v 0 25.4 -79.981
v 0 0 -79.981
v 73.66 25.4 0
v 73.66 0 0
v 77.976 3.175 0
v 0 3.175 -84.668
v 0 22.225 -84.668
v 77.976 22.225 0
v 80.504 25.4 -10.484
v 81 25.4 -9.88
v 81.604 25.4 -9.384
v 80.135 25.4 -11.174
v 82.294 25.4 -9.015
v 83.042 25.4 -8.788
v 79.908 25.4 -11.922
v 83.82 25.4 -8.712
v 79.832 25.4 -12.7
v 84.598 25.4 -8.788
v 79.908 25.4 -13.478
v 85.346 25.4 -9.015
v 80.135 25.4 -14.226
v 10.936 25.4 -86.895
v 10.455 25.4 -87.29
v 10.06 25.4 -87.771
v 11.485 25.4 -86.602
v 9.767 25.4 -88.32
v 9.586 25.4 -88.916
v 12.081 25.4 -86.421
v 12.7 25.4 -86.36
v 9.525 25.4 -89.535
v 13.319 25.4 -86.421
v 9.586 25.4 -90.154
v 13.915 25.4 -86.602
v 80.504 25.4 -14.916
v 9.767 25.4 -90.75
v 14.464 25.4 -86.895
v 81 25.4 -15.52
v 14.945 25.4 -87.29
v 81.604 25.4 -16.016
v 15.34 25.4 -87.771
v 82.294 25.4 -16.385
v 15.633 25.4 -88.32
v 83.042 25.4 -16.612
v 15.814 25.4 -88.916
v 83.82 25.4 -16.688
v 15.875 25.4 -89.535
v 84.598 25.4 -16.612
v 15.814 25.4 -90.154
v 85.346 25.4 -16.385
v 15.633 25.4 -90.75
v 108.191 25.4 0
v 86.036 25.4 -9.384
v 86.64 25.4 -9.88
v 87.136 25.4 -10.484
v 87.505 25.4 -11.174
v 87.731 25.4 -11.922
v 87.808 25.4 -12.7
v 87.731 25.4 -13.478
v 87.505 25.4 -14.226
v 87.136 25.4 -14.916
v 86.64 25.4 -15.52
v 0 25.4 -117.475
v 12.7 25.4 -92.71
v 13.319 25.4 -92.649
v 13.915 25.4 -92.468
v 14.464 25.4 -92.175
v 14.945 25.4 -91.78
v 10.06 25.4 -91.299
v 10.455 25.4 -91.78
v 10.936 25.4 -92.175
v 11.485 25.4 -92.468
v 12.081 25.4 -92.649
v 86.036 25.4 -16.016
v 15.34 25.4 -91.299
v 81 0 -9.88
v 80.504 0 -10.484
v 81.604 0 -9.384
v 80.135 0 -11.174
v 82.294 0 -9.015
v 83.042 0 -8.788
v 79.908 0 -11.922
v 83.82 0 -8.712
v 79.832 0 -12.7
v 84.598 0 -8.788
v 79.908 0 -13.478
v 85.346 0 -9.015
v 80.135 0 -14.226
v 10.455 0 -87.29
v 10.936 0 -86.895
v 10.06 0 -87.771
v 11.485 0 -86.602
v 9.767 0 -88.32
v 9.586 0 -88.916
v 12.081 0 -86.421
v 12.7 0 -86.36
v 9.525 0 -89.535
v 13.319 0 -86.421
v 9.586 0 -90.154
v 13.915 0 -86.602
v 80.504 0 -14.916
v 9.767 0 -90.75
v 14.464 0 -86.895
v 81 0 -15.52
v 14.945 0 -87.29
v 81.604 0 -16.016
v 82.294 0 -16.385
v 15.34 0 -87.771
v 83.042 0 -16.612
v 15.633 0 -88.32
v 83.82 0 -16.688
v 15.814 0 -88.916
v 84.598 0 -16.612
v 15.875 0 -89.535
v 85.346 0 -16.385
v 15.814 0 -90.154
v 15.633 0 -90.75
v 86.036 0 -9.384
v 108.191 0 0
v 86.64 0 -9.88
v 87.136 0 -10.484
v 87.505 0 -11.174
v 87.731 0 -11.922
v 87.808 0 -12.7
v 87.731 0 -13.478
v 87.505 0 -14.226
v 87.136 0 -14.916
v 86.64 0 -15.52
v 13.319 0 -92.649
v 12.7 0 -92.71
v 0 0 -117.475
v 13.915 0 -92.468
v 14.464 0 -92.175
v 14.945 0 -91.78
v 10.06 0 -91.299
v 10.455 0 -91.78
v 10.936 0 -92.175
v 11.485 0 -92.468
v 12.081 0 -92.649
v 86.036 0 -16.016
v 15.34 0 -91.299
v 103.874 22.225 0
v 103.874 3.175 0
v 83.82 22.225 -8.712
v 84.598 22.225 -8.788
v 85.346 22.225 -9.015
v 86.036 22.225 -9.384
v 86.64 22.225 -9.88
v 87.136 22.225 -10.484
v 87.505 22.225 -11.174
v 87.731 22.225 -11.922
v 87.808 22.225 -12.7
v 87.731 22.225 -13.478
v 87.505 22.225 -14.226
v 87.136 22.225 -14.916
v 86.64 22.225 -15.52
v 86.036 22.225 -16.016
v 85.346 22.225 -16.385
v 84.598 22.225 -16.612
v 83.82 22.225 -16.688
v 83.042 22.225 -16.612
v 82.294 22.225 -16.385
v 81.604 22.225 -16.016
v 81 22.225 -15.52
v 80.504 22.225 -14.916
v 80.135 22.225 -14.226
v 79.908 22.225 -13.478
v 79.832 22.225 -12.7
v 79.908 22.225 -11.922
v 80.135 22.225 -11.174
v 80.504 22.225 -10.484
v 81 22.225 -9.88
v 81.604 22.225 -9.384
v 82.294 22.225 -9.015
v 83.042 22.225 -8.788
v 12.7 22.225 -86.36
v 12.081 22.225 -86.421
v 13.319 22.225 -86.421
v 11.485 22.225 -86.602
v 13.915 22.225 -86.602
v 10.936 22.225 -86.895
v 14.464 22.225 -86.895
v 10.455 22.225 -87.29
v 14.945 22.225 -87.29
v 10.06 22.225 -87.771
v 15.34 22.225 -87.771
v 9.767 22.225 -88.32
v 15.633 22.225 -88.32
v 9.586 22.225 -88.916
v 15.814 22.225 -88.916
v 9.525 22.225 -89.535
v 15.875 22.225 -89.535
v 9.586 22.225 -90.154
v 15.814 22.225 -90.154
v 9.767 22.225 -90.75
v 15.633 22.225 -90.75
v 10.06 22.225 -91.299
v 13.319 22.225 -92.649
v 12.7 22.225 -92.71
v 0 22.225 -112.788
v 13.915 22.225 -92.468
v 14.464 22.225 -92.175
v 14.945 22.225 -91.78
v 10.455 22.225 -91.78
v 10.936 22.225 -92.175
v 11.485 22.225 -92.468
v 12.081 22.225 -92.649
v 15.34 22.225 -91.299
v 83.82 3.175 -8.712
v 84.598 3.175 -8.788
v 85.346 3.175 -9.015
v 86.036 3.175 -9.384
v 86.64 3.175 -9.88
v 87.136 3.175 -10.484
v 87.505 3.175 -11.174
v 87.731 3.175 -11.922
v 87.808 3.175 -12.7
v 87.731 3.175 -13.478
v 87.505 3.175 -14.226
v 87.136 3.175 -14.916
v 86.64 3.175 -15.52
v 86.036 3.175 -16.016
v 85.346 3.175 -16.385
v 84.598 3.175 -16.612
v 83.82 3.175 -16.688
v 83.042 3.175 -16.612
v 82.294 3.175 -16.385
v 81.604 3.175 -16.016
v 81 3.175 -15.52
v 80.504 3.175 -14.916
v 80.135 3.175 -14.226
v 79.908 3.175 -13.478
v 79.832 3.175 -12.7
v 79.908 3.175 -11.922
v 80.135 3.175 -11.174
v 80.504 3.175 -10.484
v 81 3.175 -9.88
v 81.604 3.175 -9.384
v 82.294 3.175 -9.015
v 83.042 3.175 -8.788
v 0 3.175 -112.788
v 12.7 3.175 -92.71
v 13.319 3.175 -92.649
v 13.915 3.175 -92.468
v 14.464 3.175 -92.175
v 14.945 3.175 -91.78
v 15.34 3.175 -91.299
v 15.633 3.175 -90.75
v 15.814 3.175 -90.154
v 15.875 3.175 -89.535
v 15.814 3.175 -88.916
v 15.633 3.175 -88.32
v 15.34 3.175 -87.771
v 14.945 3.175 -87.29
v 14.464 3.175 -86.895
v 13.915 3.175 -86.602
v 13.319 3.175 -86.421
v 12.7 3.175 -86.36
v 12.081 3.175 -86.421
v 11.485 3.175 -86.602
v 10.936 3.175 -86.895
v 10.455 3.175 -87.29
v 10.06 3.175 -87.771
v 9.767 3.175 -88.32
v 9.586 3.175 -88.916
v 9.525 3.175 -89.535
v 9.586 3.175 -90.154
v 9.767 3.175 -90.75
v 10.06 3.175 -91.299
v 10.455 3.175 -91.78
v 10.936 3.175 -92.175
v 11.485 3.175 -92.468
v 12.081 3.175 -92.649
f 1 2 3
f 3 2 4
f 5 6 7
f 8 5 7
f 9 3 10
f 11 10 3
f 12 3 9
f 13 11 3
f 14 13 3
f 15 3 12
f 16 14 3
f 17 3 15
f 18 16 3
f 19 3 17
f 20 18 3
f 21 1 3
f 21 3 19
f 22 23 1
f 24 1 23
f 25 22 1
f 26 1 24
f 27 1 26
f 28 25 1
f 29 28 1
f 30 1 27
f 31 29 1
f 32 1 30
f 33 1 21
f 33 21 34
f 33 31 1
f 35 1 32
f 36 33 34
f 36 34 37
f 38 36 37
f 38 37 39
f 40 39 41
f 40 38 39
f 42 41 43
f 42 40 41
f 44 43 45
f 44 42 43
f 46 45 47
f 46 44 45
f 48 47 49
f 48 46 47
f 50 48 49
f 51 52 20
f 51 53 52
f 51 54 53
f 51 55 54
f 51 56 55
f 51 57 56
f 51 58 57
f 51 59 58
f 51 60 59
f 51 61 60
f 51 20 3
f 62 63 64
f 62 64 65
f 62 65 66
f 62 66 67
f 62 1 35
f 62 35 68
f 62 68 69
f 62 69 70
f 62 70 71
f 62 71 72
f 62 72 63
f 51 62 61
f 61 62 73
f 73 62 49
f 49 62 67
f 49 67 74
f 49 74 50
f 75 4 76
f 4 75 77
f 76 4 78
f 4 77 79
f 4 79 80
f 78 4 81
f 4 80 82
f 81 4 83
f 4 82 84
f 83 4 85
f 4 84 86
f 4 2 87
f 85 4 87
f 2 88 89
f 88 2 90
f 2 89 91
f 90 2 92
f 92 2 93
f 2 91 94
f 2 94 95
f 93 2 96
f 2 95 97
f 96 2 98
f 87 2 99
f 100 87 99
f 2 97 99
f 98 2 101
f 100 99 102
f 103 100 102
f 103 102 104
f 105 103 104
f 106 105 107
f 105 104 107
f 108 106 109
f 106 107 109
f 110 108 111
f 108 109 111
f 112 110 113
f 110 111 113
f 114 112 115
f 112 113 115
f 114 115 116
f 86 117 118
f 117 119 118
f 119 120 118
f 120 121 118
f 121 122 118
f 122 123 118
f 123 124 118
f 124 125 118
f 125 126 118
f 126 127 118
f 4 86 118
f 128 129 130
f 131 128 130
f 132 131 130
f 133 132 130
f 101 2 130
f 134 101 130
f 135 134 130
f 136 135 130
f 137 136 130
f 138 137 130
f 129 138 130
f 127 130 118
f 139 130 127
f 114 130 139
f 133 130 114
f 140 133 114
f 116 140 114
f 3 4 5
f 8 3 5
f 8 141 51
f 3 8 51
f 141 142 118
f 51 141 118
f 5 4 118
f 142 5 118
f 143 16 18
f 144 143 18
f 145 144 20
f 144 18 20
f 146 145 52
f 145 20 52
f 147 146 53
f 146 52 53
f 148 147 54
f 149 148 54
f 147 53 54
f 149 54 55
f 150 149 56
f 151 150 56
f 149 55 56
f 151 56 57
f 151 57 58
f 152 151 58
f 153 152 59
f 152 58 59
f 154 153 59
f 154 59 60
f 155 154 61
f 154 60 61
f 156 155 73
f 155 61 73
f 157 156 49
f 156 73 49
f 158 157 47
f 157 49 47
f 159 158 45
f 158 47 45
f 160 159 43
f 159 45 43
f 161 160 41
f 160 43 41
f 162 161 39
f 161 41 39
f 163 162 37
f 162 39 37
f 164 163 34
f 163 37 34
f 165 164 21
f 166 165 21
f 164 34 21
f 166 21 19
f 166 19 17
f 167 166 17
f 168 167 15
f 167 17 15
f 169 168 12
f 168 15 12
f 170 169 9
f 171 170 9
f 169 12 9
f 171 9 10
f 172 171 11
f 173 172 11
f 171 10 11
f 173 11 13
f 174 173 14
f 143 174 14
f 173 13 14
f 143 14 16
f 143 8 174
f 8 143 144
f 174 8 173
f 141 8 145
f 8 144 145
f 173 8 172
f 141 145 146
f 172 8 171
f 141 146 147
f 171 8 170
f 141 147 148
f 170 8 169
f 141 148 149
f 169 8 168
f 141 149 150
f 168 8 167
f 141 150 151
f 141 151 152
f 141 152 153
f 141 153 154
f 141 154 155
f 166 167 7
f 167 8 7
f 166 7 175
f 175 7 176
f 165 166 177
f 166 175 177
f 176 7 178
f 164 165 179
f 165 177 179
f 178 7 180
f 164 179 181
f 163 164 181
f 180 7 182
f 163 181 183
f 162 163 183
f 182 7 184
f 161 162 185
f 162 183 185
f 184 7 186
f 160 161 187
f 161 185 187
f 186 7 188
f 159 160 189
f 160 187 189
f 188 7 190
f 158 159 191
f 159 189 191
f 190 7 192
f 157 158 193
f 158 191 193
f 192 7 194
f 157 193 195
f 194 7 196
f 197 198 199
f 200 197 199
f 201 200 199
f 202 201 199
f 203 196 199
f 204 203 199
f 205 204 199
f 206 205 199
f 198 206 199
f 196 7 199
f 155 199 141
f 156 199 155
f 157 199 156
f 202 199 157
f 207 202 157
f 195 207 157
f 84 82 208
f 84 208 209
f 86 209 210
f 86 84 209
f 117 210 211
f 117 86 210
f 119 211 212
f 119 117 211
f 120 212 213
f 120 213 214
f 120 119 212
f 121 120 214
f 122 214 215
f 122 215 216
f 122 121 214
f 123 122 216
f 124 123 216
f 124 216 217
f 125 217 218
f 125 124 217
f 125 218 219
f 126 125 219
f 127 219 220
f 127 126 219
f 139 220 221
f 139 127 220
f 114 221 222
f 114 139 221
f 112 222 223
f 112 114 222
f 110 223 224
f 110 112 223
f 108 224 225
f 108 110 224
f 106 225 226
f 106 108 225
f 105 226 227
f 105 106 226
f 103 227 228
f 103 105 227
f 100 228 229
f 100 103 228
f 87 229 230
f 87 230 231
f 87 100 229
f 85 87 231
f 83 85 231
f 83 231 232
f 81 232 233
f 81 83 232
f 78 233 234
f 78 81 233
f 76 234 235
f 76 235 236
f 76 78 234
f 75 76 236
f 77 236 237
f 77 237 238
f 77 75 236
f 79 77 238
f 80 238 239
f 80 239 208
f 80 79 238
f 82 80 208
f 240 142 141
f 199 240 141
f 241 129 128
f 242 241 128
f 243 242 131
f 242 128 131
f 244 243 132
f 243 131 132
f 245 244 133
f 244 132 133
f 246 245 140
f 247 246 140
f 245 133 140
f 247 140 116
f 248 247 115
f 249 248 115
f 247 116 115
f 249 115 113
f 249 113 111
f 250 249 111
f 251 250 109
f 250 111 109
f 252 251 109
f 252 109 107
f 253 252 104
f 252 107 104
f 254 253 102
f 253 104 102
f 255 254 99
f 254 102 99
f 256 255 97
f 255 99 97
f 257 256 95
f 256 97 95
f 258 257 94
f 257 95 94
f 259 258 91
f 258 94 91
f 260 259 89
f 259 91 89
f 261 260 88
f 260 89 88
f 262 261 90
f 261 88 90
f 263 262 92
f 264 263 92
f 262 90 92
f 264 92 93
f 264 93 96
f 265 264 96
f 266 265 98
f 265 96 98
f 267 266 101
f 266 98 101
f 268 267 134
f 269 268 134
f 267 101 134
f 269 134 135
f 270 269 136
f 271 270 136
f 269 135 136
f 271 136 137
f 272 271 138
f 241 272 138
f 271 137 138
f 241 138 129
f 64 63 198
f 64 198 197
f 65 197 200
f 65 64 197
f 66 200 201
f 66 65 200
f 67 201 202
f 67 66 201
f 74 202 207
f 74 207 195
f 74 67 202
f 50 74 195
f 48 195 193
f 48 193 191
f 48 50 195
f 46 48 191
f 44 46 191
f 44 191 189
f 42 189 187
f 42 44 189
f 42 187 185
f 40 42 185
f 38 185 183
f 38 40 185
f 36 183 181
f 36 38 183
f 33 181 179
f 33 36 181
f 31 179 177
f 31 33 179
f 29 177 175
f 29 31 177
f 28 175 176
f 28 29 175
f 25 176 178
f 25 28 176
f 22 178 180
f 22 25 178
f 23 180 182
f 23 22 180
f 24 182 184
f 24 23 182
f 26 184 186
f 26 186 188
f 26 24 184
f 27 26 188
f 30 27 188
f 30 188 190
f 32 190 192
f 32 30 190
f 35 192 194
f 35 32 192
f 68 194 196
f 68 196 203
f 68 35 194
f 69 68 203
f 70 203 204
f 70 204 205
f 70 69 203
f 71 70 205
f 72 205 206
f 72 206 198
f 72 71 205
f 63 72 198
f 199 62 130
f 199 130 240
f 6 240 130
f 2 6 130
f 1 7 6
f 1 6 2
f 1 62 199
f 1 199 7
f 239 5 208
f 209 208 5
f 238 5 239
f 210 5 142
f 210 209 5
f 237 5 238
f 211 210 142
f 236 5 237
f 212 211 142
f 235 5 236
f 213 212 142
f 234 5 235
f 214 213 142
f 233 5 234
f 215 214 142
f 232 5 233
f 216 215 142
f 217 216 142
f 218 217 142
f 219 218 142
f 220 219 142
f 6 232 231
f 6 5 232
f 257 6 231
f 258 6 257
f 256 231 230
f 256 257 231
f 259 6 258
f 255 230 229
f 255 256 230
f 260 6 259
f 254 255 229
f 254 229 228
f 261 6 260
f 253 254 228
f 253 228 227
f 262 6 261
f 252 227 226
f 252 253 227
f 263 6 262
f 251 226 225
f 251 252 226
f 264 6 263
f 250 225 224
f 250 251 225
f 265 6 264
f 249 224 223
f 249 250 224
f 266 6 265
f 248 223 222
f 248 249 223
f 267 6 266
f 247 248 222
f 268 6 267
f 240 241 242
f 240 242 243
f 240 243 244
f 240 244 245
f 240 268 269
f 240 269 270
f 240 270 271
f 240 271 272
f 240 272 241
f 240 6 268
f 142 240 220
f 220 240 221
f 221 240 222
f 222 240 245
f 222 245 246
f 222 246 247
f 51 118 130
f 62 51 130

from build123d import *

# Parameters (mm, degrees)
BOSS_EXTRUDE3_DEPTH = 25.4
CUT_EXTRUDE4_REACH  = 182.233
SKETCH2_W           = 19.05
SKETCH2_H           = 19.05
CUT_EXTRUDE5_DEPTH  = 25.4
SKETCH4_R           = 3.988266949
CUT_EXTRUDE6_DEPTH  = 3.175
SKETCH5_R           = 3.175
CUT_EXTRUDE7_DEPTH  = 3.175


with BuildPart() as part:
    # Sketch1 → Boss-Extrude3 (new body)
    with BuildSketch(Plane(origin=(0, 0, 0), x_dir=(1, 0, 0), z_dir=(0, 1, 0))):
        Polygon((73.659861316, 0), (108.190600856, 0), (0, 117.475), (-18.683642708, 100.267981224), align=None)
    extrude(amount=BOSS_EXTRUDE3_DEPTH)

    # Cut-Extrude4: up to this plane
    cut_extrude4_end = Plane(origin=(0, 25.4, 0), z_dir=(0, 0, -1))
    # Sketch2 → Cut-Extrude4 (cut, up to the surface)
    with BuildSketch(Plane(origin=(-58.537665842, 0, -63.563740241), x_dir=(0.735576484560878, 0, -0.6774416841035549), z_dir=(0.6774416841035549, 0, 0.735576484560878)), mode=Mode.PRIVATE) as cut_extrude4_sk1:
        with Locations((66.880665058, 12.7)):
            Rectangle(SKETCH2_W, SKETCH2_H)
    cut_extrude4_tool1 = split(extrude(cut_extrude4_sk1.sketch, amount=CUT_EXTRUDE4_REACH, mode=Mode.PRIVATE), bisect_by=cut_extrude4_end, keep=Keep.BOTH, mode=Mode.PRIVATE)
    add(cut_extrude4_tool1.solids().sort_by_distance((-9.341821, 12.7, -108.871491))[0], mode=Mode.SUBTRACT)

    # Sketch3 → Cut-Extrude5 (cut)
    with BuildSketch(Plane(origin=(0, 25.4, 0), x_dir=(1, 0, 0), z_dir=(0, 1, 0))):
        Polygon((0, 117.475), (0, 79.980997791), (-18.683642708, 100.267981224), align=None)
        Polygon((108.190600856, 0), (73.659861316, 0), (89.250643344, -17.183967795), align=None)
    extrude(amount=-CUT_EXTRUDE5_DEPTH, mode=Mode.SUBTRACT)

    # Sketch4 → Cut-Extrude6 (cut)
    with BuildSketch(Plane(origin=(0, 25.4, 0), x_dir=(1, 0, 0), z_dir=(0, 1, 0))):
        with Locations(Location((83.819861316, 12.7, 0), (0, 0, 270))):
            Circle(SKETCH4_R)
    cut_extrude6 = extrude(amount=-CUT_EXTRUDE6_DEPTH, mode=Mode.SUBTRACT)

    # Mirror1: Cut-Extrude6 across plane
    add(cut_extrude6.mirror(Plane.ZX.offset(12.7)), mode=Mode.SUBTRACT)

    # Sketch5 → Cut-Extrude7 (cut)
    with BuildSketch(Plane.XZ):
        with Locations(Location((12.7, -89.535, 0), (0, 0, 270))):
            Circle(SKETCH5_R)
    cut_extrude7 = extrude(amount=-CUT_EXTRUDE7_DEPTH, mode=Mode.SUBTRACT)

    # Mirror2: Cut-Extrude7 across plane
    add(cut_extrude7.mirror(Plane.ZX.offset(12.7)), mode=Mode.SUBTRACT)


solid = part.part
